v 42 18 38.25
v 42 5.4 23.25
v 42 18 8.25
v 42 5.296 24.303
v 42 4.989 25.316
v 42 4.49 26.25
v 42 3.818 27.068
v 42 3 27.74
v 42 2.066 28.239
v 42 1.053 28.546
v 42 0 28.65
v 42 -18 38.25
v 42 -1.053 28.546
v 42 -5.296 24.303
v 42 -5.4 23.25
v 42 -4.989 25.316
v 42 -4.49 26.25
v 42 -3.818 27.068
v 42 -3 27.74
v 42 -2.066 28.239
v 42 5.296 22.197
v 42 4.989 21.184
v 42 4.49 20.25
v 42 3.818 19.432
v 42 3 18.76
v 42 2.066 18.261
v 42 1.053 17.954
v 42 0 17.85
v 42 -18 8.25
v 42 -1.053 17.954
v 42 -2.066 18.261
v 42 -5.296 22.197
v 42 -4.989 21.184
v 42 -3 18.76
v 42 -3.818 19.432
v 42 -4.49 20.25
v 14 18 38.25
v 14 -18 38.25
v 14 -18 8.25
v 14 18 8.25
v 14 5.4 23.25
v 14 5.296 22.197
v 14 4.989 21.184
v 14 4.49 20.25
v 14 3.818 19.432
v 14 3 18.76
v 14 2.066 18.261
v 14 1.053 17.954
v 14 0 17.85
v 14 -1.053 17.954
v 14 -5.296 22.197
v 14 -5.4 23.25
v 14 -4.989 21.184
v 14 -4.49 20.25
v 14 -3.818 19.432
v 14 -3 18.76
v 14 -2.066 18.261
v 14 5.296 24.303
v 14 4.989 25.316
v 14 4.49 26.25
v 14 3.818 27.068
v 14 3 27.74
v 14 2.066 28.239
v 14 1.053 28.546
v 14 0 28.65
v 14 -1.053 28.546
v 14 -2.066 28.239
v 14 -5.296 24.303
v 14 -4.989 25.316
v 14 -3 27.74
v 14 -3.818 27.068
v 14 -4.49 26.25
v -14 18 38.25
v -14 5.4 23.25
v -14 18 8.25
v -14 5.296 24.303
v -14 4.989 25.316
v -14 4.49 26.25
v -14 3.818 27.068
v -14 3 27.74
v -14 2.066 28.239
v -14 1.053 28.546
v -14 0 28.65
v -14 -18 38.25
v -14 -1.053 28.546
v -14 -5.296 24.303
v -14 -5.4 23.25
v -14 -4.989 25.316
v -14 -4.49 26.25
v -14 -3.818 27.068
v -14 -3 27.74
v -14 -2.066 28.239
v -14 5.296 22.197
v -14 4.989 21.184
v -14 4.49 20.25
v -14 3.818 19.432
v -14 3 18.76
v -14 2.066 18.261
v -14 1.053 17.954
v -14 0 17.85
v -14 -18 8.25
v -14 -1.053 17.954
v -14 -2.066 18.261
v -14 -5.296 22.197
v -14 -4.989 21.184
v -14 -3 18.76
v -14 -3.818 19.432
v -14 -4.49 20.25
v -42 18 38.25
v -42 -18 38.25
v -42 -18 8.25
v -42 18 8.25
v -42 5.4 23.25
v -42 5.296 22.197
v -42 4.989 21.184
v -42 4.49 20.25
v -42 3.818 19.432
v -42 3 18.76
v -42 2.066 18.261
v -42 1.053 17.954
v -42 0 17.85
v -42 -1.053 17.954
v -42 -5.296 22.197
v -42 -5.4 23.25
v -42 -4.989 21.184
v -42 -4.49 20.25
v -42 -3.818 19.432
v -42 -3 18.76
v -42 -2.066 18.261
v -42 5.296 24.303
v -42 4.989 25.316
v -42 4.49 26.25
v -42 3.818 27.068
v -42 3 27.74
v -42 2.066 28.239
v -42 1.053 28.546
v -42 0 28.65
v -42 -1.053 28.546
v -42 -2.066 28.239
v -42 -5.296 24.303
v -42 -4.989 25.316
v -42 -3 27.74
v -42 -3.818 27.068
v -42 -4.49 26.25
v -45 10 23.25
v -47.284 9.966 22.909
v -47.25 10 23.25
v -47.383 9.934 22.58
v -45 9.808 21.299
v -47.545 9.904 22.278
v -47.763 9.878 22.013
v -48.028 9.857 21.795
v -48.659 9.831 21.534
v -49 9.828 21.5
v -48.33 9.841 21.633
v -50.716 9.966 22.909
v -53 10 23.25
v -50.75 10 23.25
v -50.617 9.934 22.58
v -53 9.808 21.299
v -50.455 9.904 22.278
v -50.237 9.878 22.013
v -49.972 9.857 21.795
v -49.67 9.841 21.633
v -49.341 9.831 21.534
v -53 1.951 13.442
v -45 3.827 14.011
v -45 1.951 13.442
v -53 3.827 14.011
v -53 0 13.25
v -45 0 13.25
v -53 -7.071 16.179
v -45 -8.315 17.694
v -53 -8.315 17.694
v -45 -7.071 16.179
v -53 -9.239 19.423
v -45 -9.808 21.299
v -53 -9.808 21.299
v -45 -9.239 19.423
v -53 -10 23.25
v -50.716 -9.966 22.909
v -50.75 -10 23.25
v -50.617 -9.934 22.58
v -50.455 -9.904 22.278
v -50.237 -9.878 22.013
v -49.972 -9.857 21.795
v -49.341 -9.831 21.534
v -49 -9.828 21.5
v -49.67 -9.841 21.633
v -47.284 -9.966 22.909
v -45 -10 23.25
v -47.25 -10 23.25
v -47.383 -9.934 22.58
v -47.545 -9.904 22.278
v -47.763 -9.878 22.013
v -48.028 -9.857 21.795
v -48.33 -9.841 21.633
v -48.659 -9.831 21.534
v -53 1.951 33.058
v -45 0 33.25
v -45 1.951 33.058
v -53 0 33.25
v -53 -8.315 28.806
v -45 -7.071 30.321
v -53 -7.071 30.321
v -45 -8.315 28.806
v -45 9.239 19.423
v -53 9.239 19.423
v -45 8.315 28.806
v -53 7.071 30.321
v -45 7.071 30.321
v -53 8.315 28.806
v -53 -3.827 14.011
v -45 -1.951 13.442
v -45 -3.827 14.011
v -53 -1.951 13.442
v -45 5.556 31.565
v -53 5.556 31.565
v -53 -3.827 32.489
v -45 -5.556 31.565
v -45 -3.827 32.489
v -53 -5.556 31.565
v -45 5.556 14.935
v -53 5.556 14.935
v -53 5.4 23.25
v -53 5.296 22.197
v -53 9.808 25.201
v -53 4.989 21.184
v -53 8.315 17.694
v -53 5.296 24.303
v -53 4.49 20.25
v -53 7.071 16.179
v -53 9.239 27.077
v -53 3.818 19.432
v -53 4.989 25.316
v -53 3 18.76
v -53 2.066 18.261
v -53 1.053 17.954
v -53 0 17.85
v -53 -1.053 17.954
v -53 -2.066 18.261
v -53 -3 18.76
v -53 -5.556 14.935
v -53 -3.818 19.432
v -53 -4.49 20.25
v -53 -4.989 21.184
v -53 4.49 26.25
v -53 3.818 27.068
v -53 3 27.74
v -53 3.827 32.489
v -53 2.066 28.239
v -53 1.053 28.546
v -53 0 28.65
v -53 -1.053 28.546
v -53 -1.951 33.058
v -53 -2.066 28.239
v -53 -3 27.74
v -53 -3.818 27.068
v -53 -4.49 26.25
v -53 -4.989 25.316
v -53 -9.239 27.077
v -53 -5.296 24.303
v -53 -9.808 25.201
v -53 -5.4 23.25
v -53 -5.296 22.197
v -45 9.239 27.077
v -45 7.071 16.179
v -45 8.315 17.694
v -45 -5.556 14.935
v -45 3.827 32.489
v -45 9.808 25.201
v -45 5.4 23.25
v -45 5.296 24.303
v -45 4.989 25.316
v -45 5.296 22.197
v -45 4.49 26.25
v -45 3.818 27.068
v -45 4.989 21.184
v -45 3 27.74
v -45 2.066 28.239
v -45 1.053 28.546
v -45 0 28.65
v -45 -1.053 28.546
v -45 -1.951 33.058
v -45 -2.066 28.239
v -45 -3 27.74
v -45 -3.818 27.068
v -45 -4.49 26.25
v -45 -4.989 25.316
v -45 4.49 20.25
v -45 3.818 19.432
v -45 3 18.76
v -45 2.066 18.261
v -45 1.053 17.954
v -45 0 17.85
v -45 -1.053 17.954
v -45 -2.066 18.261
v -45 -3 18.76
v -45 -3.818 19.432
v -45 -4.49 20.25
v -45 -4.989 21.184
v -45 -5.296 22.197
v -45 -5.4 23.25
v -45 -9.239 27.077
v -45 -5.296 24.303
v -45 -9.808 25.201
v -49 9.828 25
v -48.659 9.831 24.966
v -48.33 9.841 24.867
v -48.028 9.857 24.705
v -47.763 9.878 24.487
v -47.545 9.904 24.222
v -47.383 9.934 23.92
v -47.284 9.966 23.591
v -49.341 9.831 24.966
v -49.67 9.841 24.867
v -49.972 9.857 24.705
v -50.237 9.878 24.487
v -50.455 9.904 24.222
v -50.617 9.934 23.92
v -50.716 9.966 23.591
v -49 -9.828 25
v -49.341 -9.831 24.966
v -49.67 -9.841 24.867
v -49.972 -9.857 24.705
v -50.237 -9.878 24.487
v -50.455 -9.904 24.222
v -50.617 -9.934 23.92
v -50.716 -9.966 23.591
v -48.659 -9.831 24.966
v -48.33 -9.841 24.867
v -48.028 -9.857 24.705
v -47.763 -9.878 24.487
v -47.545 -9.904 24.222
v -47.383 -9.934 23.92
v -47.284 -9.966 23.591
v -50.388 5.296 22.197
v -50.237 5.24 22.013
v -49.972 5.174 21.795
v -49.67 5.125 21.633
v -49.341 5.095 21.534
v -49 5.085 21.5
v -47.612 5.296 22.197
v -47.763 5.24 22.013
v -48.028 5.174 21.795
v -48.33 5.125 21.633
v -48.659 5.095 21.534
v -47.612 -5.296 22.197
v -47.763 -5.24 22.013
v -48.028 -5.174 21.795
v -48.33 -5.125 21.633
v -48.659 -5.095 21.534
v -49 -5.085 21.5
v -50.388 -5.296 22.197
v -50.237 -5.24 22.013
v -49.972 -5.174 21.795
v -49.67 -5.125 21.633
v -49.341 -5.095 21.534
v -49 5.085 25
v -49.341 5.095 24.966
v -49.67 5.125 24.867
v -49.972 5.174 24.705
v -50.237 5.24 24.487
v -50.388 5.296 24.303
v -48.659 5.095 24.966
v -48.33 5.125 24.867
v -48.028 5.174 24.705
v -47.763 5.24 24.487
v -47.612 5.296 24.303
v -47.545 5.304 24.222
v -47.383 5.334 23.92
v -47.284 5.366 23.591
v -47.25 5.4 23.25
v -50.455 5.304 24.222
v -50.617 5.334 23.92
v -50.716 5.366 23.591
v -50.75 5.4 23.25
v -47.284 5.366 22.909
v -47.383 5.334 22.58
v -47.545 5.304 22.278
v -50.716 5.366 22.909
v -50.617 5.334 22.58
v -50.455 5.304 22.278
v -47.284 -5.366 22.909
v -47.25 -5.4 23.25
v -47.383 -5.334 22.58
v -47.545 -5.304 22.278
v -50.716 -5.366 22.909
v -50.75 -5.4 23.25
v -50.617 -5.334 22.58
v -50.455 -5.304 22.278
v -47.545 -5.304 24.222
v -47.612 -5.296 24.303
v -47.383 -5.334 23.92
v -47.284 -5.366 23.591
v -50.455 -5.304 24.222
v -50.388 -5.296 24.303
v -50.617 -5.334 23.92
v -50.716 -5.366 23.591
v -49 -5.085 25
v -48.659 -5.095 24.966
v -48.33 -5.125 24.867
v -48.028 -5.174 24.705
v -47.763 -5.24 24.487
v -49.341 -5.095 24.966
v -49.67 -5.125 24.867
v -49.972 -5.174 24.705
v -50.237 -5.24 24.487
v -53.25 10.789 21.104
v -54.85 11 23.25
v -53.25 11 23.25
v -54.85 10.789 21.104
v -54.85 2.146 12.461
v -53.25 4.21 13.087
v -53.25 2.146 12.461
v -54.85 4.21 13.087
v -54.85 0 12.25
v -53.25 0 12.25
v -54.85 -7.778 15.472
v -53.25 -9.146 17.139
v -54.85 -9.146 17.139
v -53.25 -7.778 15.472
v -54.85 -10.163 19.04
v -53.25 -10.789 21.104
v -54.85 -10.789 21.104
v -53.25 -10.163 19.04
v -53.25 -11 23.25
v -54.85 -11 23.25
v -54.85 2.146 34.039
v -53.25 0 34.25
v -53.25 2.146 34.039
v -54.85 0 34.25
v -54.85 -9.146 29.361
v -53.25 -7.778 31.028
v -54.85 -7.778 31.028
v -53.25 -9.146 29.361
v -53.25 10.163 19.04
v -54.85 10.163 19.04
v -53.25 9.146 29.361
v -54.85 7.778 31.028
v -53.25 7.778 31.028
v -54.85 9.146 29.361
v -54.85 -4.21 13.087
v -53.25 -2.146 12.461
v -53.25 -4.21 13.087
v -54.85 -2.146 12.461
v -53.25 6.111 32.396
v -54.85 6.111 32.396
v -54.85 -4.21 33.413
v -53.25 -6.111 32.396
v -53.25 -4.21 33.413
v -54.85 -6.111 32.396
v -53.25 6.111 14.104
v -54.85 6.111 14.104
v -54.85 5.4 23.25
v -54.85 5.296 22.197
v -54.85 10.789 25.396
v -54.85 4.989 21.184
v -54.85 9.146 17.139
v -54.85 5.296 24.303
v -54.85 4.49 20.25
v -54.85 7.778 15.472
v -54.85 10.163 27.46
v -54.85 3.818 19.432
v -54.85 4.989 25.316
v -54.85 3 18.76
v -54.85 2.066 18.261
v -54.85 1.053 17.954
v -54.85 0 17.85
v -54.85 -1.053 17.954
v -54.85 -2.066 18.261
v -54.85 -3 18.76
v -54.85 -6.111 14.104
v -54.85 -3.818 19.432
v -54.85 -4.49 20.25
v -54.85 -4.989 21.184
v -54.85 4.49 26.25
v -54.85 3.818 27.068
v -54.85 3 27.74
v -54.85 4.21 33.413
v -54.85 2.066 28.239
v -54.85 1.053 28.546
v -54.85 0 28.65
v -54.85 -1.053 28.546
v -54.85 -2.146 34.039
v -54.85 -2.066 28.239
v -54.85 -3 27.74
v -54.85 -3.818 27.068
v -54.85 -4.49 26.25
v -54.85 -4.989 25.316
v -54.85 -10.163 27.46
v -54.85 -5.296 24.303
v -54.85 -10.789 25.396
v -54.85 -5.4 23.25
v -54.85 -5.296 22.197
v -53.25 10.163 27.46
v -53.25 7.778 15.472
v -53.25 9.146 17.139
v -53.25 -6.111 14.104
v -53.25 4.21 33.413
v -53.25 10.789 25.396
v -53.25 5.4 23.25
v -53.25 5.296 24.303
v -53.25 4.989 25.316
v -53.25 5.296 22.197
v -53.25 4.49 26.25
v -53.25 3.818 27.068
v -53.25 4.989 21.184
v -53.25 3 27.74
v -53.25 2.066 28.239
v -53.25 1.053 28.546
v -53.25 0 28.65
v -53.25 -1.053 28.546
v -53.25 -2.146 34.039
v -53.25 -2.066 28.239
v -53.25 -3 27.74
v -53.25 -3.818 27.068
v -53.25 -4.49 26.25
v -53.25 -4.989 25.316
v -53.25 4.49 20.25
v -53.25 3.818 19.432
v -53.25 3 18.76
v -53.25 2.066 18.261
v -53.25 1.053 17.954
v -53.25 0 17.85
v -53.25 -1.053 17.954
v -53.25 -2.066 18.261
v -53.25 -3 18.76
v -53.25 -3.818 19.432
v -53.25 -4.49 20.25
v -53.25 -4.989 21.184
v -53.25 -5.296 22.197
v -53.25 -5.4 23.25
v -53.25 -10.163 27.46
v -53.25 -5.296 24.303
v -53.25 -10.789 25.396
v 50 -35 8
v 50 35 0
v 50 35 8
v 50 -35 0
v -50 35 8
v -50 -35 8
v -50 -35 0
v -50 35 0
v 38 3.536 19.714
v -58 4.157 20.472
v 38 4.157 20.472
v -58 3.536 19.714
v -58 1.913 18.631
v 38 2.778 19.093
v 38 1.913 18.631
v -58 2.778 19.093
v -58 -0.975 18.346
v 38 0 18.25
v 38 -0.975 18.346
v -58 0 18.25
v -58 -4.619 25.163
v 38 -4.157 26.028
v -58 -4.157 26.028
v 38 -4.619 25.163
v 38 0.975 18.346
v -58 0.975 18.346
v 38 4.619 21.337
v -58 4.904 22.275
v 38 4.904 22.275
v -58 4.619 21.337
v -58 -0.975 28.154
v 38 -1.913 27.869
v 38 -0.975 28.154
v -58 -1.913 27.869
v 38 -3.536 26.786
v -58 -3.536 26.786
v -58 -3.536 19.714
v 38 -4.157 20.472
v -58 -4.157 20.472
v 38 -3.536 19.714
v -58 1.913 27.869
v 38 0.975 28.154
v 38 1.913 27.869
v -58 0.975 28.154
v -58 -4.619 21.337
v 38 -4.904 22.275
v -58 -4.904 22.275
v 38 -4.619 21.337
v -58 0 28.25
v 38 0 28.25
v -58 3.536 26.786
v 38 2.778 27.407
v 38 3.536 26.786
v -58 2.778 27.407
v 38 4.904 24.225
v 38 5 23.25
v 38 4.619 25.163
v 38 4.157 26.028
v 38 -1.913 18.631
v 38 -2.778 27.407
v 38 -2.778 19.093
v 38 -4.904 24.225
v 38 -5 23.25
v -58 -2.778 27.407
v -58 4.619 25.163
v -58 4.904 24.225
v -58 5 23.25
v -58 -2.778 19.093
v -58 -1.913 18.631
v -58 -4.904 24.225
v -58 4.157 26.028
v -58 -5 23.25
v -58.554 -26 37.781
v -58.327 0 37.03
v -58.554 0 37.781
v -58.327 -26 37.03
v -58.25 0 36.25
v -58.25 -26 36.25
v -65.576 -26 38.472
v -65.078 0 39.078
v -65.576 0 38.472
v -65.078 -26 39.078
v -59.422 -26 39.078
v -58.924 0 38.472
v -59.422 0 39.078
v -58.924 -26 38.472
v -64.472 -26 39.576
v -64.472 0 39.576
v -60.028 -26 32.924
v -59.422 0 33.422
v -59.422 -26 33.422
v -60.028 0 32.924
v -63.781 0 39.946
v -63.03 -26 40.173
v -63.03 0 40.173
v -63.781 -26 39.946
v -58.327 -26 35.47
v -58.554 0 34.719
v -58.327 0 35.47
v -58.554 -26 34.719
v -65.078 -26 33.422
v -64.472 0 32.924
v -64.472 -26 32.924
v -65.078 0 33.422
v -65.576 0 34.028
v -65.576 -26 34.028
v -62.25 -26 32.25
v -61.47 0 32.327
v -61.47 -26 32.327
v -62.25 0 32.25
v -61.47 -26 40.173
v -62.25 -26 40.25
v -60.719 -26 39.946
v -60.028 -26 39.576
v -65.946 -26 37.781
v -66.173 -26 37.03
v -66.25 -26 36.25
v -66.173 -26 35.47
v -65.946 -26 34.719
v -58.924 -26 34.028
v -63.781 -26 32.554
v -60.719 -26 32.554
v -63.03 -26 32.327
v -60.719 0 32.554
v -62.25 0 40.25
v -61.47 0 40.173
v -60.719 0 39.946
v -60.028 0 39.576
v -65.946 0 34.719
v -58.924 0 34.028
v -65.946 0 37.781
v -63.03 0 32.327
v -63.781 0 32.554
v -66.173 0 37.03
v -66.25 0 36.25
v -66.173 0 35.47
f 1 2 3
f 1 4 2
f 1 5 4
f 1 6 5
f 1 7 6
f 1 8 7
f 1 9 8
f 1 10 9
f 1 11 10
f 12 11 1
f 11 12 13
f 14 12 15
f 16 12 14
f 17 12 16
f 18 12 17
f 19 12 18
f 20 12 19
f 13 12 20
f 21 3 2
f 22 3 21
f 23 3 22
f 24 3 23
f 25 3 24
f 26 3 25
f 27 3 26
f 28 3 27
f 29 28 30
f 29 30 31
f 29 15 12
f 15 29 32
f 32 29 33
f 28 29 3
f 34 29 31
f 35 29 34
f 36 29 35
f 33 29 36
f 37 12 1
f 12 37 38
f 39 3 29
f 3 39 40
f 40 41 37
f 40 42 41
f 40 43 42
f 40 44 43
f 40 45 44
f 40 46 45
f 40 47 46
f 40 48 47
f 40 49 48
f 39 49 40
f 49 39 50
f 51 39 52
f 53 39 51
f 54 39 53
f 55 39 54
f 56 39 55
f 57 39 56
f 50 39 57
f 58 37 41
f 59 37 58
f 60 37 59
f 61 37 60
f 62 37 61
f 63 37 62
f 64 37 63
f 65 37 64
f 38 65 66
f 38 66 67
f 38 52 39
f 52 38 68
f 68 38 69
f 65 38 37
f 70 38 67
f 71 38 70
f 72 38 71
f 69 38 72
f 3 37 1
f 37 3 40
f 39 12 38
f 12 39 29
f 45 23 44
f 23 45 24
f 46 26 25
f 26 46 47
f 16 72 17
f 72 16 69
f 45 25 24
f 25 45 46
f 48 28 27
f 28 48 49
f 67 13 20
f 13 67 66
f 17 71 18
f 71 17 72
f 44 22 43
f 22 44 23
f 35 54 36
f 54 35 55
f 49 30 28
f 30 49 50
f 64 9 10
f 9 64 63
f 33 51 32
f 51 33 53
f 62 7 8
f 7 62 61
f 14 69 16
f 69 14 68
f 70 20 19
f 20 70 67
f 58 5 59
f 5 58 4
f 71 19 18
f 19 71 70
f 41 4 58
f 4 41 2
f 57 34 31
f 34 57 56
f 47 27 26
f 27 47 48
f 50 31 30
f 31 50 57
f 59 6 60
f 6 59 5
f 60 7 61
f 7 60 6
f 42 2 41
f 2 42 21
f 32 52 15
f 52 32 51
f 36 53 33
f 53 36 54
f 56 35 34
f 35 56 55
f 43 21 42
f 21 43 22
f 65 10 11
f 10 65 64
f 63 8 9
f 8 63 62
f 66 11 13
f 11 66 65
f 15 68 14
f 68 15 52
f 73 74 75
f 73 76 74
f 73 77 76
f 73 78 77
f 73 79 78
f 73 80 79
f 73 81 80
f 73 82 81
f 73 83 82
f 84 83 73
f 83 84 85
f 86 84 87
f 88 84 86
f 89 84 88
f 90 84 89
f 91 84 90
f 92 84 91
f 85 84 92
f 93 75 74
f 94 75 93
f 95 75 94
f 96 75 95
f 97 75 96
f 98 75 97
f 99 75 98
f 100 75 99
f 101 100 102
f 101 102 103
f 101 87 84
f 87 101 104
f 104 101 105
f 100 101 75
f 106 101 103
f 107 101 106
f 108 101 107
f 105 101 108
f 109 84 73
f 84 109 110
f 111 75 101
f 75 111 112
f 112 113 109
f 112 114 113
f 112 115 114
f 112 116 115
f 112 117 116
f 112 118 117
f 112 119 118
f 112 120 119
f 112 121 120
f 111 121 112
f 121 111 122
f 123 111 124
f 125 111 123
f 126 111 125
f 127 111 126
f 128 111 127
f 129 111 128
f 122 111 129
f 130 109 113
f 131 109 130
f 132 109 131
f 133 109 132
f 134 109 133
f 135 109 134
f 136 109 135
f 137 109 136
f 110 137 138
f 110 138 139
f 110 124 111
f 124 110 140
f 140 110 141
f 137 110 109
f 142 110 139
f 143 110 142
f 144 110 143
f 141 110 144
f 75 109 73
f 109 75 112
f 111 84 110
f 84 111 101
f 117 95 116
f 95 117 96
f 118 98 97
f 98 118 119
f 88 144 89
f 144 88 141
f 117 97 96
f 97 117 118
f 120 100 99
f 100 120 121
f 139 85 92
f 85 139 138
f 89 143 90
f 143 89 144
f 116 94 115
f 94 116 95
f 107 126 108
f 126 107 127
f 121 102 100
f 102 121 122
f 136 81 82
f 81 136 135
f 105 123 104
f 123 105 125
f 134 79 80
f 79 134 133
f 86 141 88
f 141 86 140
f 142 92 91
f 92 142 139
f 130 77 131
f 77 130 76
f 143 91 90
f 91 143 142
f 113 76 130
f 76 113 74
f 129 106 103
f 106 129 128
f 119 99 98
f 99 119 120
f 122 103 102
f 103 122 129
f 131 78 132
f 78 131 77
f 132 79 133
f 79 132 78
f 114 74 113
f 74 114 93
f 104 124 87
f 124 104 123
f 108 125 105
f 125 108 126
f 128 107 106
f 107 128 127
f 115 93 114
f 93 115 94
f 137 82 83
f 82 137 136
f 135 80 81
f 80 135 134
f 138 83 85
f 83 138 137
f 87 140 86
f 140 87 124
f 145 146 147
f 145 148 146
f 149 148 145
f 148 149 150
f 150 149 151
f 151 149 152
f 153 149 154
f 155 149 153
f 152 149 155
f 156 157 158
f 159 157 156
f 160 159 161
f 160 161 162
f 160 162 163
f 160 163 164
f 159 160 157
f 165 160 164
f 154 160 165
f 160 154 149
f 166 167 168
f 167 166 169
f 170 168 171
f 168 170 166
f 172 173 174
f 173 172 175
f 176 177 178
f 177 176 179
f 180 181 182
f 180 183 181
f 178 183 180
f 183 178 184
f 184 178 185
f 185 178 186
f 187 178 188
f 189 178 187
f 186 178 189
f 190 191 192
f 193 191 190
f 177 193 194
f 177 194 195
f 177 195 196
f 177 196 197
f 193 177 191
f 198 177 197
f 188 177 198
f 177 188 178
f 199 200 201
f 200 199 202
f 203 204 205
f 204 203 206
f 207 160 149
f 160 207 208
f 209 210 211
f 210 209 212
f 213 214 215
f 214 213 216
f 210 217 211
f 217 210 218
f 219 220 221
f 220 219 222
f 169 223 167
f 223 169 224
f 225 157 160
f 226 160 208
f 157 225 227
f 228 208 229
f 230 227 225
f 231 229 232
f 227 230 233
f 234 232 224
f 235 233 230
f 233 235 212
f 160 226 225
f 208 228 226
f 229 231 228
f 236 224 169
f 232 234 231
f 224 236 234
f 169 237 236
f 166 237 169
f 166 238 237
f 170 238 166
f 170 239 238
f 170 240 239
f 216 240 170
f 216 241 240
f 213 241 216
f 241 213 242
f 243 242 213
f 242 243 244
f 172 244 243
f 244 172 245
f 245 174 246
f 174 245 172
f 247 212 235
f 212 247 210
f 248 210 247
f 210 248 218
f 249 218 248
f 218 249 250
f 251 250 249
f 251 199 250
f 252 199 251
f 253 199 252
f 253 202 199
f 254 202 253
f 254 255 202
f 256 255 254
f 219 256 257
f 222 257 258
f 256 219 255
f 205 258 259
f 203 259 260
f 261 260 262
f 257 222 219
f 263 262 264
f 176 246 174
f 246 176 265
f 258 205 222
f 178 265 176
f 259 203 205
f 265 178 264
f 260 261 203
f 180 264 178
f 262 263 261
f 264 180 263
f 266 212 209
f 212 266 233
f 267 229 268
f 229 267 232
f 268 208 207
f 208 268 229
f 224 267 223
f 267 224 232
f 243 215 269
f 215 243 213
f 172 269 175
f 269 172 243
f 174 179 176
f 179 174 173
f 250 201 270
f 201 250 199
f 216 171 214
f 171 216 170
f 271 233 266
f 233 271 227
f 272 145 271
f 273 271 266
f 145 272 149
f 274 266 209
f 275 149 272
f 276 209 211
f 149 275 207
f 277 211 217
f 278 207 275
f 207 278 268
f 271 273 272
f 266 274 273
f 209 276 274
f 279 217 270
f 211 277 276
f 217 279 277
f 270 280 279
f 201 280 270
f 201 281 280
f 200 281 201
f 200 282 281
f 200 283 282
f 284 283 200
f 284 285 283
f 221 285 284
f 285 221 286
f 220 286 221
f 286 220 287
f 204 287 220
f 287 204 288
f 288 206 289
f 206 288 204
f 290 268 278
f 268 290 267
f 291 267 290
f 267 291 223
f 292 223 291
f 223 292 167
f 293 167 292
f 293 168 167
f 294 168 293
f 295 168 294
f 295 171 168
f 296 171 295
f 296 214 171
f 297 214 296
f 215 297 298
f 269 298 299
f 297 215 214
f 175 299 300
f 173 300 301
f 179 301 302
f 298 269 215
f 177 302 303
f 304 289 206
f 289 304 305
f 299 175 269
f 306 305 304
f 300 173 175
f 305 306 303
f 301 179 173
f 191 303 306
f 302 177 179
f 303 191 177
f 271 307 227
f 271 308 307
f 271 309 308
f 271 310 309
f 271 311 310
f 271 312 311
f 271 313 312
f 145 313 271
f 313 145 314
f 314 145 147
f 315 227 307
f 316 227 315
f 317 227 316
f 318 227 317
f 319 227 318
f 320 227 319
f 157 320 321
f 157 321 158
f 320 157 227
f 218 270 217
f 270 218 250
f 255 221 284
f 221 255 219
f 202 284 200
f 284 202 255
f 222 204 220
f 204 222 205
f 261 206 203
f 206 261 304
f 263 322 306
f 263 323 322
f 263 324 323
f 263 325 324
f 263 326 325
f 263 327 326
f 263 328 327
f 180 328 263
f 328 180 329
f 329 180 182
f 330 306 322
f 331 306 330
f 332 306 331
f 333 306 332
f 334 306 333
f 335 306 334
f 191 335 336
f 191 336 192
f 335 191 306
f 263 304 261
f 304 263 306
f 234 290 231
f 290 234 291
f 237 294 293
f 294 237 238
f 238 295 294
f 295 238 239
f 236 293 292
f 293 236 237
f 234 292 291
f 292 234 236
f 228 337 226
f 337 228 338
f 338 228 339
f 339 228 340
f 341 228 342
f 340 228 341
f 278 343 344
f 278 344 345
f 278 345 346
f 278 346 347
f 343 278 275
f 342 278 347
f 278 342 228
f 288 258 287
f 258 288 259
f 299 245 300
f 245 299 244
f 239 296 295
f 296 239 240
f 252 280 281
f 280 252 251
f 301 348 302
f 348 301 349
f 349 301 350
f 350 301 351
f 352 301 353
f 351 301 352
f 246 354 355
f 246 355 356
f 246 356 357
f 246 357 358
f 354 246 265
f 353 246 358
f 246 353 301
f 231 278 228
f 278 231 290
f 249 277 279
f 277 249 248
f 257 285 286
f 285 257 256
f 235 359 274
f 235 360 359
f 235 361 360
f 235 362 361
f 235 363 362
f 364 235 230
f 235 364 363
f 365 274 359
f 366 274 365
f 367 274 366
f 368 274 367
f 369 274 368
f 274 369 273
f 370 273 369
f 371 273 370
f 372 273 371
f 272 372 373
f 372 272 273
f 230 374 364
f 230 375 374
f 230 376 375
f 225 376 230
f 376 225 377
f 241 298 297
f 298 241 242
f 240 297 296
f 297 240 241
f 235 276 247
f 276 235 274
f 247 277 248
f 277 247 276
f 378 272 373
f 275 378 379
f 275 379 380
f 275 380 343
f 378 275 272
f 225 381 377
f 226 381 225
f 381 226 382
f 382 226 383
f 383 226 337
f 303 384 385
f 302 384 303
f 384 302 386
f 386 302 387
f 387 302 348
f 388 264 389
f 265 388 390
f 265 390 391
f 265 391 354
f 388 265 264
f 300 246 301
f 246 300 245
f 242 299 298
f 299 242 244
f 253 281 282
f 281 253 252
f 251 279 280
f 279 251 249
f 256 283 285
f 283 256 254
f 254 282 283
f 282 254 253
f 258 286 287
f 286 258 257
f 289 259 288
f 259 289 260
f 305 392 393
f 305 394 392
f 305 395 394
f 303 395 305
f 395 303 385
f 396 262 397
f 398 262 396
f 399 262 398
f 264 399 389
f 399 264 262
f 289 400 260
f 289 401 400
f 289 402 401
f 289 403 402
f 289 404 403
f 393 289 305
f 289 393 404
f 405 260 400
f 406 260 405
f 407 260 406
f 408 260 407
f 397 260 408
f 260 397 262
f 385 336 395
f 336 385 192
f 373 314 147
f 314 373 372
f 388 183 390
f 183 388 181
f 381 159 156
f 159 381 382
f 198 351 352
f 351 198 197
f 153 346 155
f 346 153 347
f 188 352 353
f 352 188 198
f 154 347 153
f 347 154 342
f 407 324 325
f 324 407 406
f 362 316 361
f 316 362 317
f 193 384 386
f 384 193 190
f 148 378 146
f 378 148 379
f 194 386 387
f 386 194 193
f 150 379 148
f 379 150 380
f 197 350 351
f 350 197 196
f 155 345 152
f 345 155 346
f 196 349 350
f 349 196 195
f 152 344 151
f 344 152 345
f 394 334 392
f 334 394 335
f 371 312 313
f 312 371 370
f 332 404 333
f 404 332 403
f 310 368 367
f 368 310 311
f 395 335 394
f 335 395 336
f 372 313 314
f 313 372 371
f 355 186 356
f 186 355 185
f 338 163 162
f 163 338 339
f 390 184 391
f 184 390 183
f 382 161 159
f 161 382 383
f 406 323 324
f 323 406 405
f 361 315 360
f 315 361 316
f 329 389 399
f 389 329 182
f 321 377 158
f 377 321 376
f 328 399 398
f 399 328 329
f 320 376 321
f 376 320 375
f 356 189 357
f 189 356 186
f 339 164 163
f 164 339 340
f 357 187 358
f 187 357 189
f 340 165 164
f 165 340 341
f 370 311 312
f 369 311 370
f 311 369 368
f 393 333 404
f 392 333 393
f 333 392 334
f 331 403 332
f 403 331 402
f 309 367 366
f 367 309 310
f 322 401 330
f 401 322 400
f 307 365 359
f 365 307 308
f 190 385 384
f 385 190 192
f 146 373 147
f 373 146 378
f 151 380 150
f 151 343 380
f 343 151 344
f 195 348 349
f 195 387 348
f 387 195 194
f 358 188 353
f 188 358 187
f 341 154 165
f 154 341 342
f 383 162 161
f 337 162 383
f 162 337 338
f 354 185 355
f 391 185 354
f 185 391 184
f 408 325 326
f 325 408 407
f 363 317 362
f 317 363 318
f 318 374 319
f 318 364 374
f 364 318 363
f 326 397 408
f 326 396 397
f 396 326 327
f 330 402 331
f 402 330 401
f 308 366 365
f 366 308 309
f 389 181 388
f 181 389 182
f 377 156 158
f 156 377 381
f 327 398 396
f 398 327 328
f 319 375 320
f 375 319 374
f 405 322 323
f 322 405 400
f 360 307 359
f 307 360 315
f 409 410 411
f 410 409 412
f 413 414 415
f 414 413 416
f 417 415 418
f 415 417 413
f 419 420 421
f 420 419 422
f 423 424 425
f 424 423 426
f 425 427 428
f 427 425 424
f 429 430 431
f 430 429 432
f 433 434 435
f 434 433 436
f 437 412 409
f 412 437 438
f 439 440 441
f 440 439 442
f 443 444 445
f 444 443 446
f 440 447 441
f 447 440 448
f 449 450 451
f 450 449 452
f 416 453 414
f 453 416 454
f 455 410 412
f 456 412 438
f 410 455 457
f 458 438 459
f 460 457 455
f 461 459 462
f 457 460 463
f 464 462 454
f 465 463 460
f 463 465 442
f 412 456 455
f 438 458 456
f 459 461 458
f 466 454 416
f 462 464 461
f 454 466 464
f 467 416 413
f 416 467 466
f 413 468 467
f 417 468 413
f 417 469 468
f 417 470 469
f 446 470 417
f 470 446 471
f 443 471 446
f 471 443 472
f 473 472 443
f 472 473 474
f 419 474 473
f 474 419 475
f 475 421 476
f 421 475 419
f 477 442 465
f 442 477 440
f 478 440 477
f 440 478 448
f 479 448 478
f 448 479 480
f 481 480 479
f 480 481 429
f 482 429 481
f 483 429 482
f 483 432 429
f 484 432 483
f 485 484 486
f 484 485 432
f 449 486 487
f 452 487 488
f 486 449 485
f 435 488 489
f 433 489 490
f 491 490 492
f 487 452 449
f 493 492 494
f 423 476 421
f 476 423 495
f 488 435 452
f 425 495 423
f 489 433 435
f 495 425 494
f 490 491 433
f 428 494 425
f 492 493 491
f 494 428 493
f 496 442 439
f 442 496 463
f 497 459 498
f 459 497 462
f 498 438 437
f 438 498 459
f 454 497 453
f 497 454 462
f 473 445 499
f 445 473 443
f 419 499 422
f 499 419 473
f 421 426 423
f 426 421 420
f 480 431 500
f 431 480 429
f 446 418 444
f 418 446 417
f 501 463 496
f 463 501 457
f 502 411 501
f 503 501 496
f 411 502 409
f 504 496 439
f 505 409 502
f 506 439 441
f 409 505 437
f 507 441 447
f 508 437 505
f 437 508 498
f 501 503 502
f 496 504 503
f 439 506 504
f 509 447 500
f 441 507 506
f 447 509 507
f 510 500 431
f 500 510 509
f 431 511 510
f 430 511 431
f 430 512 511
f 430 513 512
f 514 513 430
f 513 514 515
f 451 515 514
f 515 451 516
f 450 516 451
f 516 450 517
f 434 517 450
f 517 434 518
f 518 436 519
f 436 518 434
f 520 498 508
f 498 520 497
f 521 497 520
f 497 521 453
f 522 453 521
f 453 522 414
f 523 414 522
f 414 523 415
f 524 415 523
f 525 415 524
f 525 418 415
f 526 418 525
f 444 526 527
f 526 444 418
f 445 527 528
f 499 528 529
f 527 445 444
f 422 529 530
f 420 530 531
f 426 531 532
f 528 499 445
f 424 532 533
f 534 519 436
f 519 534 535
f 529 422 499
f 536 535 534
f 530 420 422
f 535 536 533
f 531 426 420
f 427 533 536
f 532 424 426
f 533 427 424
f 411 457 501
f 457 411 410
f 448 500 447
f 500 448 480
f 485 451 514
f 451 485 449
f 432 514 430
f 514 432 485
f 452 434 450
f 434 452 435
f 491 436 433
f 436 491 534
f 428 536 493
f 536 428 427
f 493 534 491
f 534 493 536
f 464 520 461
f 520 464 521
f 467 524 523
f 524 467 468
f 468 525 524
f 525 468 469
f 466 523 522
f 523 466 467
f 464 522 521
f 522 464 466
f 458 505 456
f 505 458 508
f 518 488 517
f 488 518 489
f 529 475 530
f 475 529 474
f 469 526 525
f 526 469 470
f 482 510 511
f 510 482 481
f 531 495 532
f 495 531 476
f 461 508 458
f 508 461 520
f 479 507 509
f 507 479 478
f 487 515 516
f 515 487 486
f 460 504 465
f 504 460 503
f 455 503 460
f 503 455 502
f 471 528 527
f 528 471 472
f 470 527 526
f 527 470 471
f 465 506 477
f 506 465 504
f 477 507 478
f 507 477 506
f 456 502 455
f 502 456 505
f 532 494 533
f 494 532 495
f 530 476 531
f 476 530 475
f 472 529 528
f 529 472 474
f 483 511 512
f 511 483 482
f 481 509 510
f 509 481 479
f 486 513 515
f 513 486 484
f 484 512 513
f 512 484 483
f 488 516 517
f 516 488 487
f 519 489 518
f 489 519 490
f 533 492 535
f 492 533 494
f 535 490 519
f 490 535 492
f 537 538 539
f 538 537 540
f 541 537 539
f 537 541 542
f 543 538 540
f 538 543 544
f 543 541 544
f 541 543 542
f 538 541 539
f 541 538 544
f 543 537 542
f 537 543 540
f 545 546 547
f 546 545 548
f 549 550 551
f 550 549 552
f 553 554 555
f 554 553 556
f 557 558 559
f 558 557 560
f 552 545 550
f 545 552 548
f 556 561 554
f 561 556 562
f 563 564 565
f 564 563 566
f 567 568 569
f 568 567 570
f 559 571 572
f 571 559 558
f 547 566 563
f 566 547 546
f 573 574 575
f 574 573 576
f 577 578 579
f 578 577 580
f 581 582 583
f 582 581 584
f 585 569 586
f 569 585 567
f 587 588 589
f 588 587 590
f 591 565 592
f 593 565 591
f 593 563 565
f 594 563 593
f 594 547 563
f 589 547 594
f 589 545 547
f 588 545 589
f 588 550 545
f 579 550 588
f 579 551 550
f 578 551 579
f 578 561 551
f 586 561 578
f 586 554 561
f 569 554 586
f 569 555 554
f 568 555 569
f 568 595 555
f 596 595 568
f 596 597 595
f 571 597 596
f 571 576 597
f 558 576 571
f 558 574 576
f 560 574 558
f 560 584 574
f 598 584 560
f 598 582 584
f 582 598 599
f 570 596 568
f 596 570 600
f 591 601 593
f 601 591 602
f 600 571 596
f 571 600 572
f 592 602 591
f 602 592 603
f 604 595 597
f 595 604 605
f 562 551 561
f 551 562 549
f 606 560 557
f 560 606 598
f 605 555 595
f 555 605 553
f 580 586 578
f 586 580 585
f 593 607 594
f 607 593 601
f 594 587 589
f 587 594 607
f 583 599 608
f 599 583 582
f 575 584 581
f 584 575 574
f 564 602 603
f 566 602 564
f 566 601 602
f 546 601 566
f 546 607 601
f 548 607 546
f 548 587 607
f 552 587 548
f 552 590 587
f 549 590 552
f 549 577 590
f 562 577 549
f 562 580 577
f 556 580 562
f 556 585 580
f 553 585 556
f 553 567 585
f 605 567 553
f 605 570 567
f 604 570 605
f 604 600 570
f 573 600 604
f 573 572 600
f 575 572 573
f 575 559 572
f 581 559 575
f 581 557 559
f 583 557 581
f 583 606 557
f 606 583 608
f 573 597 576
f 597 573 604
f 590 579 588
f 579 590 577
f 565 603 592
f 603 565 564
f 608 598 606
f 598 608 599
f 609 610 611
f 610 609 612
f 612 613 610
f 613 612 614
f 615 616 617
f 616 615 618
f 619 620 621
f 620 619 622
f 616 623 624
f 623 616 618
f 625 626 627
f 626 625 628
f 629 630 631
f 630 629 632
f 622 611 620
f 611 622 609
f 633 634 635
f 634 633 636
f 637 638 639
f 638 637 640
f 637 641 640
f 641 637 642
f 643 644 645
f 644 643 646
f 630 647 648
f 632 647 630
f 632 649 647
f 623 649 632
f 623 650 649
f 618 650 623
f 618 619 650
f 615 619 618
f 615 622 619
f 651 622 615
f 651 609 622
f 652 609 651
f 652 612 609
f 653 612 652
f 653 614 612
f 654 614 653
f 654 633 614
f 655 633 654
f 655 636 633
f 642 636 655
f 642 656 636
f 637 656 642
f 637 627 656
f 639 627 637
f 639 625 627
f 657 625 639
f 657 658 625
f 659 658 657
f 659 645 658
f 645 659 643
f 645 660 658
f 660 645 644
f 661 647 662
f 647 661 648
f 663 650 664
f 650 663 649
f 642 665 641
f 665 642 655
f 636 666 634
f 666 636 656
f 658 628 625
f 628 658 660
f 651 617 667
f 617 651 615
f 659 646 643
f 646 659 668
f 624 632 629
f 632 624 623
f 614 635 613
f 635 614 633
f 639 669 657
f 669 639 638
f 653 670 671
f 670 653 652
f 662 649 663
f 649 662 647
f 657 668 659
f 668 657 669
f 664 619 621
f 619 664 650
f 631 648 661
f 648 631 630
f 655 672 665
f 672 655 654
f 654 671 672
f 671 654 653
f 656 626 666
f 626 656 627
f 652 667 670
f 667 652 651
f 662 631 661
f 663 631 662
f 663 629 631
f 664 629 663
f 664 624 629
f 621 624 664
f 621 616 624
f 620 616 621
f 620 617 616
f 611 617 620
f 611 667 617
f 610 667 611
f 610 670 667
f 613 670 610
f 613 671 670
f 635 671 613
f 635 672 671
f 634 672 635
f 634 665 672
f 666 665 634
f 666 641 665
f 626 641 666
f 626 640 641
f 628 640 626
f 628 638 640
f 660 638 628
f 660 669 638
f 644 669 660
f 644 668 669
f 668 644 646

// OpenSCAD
$fn = 32;

// ------------------------------------------------------------------------
// Machine vise: screw d10, jaws 28 x 30 mm
// Every part is its own module, assembly() places every instance.
// ------------------------------------------------------------------------

// --- part 1 ---
module vise_bed() {
  difference() {
    translate([-50, -35, 0]) cube([100, 70, 8]);
  }
}

// --- part 2 ---
module vise_jaw() {
  difference() {
    translate([-14, -18, 0]) cube([28, 36, 30]);
    translate([0, 0, 15]) rotate([0, 90, 0]) cylinder(h = 30, d = 10.8, center = true);
  }
}

// --- part 3 ---
module vise_screw() {
  translate([0, 0, -48]) cylinder(h = 96, d = 10);
}

// --- part 4 ---
module screw_collar() {
  difference() {
    cylinder(h = 8, d = 20);
    translate([0, 0, -1]) cylinder(h = 10, d = 10.8);
    translate([0, 0, 4]) rotate([90, 0, 0]) cylinder(h = 22, d = 3.5, center = true);
  }
}

// --- part 5 ---
module screw_washer() {
  difference() {
      translate([0, 0, 0]) cylinder(h = 1.6, d = 22);
      translate([0, 0, -1]) cylinder(h = 3.6, d = 10.8);
    }
}

// --- part 6 ---
module vise_handle() {
  cylinder(h = 26, d = 8);
}

// --- assembly ---
module assembly() {
  color([0.80, 0.24, 0.20]) translate([0, 0, 0]) rotate([0, 0, 0]) vise_bed();
  color([0.20, 0.45, 0.75]) translate([28, 0, 8.25]) rotate([0, 0, 0]) vise_jaw();
  color([0.25, 0.62, 0.32]) translate([-28, 0, 8.25]) rotate([0, 0, 0]) vise_jaw();
  color([0.92, 0.70, 0.18]) translate([-10, 0, 23.25]) rotate([0, 90, 0]) vise_screw();
  color([0.58, 0.35, 0.70]) translate([-53, 0, 23.25]) rotate([0, 90, 0]) screw_collar();
  color([0.16, 0.66, 0.66]) translate([-54.85, 0, 23.25]) rotate([0, 90, 0]) screw_washer();
  color([0.85, 0.48, 0.18]) translate([-62.25, 0, 36.25]) rotate([90, 0, 0]) vise_handle();
}

assembly();
